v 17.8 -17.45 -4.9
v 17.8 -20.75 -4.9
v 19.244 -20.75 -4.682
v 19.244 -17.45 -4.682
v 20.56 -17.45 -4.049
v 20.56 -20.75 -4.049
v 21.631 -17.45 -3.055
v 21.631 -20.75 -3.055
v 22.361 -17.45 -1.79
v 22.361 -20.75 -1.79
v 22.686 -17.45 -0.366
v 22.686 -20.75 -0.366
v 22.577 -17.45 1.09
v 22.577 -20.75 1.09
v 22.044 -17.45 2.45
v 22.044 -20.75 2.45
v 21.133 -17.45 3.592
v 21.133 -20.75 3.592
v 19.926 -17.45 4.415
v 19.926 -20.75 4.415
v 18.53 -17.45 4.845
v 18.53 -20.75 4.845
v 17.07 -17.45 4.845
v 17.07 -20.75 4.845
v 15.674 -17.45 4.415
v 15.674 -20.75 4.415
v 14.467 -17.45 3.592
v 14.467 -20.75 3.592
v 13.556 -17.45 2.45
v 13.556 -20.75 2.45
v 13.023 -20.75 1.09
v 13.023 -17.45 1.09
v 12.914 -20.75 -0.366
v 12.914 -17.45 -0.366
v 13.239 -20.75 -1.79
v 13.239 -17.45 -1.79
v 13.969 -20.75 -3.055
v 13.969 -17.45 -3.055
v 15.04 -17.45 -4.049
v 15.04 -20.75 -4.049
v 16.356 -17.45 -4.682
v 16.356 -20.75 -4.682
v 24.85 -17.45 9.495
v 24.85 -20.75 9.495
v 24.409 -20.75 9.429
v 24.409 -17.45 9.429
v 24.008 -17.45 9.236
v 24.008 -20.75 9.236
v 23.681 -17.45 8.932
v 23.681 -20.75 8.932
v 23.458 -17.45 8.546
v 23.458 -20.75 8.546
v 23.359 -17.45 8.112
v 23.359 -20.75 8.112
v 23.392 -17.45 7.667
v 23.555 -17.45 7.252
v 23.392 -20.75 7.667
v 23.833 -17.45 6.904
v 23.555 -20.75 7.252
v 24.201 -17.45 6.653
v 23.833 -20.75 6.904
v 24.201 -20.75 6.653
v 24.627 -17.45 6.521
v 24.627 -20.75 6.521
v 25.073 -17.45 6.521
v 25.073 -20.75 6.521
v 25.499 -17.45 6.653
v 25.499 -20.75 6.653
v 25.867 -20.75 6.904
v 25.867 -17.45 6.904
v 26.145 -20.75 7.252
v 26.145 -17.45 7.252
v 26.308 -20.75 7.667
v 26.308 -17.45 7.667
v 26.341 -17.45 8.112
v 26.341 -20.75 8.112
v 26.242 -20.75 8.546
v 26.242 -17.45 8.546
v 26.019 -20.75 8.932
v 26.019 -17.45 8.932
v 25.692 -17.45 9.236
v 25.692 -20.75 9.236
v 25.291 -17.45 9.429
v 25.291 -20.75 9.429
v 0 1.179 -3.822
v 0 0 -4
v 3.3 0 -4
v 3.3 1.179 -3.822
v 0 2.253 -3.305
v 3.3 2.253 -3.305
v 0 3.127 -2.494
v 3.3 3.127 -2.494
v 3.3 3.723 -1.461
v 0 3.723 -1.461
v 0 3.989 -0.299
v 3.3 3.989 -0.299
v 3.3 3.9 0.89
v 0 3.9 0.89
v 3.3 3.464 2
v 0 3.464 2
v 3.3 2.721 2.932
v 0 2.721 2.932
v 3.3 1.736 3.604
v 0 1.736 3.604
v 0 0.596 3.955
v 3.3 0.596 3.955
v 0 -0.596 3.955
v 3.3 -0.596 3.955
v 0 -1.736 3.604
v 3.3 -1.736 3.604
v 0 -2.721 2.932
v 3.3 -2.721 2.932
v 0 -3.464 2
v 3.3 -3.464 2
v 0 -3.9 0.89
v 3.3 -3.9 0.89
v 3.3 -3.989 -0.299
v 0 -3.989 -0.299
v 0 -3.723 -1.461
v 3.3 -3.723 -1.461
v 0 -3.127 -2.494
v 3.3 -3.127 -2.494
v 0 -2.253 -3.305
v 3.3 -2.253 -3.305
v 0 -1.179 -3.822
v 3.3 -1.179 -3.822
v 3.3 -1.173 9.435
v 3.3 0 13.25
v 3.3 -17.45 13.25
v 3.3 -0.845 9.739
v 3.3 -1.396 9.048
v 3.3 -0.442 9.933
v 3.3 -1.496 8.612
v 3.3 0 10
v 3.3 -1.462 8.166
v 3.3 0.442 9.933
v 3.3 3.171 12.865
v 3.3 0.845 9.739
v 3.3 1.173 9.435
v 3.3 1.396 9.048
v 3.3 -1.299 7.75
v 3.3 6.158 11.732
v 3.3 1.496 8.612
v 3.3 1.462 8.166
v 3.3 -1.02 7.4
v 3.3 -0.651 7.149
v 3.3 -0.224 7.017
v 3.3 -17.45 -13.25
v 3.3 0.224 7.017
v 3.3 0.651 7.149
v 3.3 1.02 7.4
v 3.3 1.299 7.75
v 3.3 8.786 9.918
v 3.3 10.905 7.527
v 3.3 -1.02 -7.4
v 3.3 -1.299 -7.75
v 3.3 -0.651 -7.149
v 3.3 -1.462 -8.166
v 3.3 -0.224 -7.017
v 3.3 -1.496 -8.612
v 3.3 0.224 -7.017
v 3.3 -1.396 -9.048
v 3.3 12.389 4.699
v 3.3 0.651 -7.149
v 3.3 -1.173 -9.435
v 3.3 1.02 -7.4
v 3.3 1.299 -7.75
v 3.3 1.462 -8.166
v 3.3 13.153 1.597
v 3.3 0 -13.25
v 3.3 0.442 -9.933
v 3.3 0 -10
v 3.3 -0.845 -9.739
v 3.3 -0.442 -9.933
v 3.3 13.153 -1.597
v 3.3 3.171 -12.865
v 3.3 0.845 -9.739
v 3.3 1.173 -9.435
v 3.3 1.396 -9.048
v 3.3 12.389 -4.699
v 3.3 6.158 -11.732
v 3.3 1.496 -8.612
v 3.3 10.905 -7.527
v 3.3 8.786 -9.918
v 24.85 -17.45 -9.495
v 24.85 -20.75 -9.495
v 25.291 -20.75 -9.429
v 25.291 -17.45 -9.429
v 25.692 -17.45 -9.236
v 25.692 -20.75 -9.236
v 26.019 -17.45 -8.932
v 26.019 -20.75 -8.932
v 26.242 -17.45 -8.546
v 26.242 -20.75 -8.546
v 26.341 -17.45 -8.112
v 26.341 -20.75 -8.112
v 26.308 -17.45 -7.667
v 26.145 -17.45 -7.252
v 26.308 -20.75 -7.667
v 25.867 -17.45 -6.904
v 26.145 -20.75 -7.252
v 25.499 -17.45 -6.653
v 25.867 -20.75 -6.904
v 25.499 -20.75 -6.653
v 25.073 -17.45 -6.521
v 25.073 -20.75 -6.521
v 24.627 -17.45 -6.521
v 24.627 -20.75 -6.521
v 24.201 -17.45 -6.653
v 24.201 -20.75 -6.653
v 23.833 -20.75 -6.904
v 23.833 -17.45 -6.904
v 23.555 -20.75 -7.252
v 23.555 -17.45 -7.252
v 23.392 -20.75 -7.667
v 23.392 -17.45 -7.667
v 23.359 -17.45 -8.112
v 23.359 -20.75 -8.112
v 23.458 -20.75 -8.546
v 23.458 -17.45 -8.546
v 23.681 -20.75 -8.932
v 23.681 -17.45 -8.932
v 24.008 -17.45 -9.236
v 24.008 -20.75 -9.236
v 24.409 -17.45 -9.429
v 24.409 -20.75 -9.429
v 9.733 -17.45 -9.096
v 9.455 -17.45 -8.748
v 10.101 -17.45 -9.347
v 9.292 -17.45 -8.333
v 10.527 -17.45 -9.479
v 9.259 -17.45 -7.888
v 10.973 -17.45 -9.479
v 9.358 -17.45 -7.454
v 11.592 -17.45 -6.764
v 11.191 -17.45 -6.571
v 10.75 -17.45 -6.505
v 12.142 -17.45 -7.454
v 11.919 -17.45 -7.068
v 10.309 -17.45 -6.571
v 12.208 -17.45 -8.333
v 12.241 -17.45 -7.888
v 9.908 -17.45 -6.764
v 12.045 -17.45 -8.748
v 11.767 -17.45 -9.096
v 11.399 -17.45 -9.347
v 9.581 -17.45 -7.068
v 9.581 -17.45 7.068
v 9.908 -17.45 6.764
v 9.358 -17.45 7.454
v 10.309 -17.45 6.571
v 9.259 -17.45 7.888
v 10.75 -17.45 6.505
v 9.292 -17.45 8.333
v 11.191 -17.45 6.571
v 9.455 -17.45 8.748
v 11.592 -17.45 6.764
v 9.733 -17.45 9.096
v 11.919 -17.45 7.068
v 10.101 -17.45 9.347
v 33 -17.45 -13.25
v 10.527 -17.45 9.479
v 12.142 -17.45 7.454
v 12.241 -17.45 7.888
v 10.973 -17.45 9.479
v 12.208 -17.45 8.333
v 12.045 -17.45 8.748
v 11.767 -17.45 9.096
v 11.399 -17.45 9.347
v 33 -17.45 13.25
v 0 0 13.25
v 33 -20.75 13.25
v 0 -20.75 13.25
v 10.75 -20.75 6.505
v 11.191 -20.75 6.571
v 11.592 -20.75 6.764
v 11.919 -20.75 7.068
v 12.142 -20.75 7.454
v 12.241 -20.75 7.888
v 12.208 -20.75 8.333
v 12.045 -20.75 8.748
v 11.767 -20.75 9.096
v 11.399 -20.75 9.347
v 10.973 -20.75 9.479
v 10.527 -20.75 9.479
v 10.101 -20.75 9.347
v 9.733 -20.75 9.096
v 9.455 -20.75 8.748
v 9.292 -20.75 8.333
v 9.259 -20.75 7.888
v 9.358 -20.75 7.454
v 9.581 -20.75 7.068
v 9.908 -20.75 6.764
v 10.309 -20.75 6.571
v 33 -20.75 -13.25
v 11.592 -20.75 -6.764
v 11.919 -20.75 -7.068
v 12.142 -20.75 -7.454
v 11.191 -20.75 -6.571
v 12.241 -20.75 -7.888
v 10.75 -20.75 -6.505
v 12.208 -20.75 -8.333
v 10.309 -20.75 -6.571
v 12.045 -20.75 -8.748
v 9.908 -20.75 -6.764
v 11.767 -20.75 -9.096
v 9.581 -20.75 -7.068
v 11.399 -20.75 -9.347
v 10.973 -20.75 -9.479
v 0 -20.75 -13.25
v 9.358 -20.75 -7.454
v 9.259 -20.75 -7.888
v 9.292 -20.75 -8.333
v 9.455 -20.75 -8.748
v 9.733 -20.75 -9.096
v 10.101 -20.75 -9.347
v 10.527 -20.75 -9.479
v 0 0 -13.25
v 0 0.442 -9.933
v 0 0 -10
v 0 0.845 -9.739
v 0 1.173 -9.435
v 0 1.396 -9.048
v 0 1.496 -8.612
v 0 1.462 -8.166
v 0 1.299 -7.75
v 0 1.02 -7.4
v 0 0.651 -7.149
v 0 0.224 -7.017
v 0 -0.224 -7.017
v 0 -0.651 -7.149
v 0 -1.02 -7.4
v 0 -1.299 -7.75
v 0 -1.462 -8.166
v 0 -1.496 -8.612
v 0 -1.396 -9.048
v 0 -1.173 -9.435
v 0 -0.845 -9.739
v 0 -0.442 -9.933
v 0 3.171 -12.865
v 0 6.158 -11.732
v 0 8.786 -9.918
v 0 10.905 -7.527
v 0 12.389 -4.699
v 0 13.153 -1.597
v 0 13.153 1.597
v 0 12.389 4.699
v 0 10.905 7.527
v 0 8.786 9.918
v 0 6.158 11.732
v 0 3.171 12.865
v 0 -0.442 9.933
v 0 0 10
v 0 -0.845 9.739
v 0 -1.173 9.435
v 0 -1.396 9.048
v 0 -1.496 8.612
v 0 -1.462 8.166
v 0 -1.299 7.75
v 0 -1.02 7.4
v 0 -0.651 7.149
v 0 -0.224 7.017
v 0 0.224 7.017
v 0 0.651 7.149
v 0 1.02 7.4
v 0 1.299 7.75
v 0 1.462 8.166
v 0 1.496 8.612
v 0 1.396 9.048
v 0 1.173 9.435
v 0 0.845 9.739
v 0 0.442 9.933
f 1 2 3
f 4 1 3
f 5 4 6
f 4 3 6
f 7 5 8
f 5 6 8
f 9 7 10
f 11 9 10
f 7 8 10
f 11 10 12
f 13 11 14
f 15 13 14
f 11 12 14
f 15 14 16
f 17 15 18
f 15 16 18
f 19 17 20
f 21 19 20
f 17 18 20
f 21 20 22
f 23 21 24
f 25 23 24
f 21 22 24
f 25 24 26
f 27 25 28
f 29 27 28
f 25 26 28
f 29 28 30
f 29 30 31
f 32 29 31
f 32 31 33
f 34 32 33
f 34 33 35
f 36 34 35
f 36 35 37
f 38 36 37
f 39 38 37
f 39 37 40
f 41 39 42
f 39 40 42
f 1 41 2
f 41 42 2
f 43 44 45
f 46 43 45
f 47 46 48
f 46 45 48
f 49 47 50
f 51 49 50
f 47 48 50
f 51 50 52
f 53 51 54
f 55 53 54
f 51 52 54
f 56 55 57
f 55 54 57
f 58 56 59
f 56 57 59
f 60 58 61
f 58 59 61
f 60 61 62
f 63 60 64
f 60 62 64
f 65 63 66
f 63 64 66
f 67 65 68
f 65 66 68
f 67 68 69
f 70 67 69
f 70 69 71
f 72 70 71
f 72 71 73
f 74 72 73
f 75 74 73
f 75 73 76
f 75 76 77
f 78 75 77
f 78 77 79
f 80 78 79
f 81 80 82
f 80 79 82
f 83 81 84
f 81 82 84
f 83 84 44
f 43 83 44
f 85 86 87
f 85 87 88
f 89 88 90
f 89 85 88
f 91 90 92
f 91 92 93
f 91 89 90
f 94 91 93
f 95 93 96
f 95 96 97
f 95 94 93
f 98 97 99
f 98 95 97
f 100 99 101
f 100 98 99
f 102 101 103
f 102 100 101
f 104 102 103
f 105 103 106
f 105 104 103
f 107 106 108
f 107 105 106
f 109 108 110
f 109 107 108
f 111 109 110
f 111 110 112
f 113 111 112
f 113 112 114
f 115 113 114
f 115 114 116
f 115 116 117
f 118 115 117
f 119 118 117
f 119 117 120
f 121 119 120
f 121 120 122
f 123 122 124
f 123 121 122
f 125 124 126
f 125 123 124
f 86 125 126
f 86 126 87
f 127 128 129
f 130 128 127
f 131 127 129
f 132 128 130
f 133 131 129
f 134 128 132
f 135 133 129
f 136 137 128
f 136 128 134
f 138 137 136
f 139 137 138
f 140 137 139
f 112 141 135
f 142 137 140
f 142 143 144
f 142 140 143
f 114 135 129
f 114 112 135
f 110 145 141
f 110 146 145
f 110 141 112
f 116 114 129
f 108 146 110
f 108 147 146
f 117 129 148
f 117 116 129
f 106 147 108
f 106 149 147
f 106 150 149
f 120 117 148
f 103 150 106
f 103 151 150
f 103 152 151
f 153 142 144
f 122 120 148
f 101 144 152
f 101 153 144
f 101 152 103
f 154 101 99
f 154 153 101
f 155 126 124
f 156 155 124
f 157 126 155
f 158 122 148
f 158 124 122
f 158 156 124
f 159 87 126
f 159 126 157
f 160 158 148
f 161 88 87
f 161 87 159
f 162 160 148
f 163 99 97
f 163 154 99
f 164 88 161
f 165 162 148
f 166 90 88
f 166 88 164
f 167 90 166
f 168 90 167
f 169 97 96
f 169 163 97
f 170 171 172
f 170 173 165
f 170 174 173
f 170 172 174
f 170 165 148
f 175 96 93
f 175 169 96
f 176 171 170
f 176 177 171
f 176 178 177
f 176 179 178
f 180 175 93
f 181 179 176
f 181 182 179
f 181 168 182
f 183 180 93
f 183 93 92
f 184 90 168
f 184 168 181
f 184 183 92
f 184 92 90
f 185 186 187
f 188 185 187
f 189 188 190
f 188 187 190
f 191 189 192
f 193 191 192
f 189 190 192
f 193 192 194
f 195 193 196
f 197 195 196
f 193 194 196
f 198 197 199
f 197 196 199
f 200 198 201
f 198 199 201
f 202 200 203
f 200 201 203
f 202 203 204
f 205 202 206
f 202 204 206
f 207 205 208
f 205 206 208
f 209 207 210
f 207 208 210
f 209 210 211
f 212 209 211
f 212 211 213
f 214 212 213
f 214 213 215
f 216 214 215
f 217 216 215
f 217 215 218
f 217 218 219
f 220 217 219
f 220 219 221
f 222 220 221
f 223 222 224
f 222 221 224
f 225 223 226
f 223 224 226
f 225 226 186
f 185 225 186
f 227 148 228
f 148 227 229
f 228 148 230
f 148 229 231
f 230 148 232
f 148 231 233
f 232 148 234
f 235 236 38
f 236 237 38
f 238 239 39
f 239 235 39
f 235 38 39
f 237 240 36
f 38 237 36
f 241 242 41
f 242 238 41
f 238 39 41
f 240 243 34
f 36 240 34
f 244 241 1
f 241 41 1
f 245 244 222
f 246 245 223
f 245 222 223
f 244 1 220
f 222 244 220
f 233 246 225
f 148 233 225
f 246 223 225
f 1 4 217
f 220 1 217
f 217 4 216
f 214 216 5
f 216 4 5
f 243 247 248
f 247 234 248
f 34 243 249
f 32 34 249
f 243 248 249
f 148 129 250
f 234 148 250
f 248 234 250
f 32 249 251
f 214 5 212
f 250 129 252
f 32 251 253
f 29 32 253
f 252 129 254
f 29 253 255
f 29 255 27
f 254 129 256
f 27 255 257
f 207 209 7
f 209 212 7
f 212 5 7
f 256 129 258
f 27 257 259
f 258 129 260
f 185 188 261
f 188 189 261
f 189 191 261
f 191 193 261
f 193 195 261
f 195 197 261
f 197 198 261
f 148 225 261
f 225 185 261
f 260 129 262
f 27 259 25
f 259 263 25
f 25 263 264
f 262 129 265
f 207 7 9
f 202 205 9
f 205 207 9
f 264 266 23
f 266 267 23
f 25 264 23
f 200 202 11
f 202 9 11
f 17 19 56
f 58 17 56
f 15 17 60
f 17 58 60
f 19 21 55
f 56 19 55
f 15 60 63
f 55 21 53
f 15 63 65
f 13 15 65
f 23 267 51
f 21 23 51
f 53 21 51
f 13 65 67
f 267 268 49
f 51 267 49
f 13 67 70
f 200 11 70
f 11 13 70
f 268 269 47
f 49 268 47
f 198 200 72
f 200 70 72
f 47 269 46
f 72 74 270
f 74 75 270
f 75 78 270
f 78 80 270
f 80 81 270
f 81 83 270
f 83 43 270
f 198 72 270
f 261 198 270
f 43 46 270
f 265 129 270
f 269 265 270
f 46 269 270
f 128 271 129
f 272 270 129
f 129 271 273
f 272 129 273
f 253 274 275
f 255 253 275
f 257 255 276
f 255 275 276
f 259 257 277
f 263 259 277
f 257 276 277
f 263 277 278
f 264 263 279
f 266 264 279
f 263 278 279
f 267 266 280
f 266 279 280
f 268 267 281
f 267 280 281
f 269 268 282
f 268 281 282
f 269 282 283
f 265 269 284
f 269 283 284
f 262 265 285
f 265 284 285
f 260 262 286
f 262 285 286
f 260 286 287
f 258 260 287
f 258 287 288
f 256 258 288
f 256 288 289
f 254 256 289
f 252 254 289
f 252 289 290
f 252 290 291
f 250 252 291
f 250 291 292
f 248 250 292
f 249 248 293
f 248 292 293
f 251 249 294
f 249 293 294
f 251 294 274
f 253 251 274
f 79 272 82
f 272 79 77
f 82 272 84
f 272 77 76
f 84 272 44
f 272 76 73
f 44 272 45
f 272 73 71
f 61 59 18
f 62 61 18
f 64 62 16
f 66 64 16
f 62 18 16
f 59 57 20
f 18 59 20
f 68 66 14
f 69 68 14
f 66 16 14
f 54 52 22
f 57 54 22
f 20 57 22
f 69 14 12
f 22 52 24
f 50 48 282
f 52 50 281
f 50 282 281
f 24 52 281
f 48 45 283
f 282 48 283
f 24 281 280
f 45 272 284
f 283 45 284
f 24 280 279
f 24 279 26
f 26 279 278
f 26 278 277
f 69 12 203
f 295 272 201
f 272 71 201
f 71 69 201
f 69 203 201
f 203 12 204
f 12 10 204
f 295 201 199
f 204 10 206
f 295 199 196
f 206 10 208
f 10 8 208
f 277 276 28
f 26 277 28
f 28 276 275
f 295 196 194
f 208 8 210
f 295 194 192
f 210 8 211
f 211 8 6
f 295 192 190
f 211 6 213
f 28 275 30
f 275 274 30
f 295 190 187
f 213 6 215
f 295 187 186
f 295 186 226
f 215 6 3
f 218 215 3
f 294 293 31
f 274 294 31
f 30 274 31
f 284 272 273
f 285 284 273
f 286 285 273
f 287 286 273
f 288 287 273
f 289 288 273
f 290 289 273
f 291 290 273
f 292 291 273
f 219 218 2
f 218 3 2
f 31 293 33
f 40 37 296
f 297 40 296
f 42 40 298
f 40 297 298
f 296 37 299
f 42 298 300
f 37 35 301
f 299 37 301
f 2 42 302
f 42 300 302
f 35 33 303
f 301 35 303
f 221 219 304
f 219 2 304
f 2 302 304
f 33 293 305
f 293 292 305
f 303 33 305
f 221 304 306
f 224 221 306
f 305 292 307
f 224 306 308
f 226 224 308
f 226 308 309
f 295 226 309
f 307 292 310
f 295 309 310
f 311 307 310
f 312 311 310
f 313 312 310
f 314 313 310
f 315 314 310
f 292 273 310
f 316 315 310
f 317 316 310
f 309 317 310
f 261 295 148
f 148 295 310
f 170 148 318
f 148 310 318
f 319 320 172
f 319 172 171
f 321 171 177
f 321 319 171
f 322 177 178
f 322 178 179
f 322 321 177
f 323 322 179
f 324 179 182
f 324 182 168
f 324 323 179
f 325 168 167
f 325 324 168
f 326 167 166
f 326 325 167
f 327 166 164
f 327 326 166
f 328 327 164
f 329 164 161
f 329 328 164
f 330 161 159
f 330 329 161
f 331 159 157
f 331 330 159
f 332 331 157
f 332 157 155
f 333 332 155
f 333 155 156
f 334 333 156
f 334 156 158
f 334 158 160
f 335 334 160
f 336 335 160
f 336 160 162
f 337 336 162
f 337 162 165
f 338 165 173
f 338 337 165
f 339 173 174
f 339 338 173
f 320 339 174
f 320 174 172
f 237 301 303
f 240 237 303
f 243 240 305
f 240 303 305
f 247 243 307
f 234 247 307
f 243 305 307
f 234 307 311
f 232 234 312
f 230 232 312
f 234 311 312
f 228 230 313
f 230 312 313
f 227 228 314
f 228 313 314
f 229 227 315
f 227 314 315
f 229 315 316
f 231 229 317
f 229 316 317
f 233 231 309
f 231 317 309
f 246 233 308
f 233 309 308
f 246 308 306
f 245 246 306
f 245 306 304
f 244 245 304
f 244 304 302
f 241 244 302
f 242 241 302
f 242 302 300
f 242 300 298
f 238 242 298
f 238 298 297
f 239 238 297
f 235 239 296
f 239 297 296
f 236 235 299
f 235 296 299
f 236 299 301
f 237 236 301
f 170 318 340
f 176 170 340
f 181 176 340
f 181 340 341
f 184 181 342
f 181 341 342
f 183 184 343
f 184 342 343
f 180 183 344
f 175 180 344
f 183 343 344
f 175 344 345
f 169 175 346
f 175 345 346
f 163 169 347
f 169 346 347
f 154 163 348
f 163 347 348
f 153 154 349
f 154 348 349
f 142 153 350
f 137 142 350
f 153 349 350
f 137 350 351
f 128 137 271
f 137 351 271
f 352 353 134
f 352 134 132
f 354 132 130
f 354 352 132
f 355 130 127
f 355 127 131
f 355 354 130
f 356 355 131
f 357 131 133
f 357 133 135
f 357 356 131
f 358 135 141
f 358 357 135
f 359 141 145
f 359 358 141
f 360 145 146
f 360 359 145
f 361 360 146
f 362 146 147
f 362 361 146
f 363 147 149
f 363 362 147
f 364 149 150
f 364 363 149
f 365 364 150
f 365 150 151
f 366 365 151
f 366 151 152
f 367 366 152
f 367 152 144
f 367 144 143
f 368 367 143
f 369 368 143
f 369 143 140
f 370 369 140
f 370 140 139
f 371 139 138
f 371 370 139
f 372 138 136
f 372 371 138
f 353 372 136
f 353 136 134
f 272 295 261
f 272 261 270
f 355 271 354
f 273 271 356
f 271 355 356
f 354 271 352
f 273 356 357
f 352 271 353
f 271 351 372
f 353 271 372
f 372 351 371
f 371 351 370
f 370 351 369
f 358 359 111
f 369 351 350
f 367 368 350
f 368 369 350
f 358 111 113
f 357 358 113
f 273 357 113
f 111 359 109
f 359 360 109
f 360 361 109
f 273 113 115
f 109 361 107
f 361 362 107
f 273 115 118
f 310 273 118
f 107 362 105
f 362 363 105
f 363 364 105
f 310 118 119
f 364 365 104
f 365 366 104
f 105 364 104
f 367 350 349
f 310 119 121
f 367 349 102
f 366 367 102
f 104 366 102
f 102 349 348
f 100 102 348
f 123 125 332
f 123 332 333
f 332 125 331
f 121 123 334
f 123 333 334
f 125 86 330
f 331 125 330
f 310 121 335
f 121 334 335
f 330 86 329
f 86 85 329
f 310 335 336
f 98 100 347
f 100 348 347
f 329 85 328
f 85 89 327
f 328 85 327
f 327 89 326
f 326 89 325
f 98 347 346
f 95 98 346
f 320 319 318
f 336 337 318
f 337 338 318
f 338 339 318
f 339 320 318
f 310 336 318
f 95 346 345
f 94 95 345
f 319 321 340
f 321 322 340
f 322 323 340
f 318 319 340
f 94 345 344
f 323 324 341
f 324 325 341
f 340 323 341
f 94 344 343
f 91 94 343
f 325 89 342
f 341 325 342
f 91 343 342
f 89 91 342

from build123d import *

# Parameters (mm, degrees)
SKETCH_1_R      = 4
SKETCH_1_R_2    = 1.5
EXTRUDE_1_DEPTH = 3.3
SKETCH_2_W      = 33
SKETCH_2_H      = 26.5
SKETCH_2_R      = 4.9
SKETCH_2_R_2    = 1.495427909
EXTRUDE_2_DEPTH = 3.3


with BuildPart() as part:
    # 草图1 → 凸台-拉伸1 (new body)
    with BuildSketch(Plane(origin=(0, 0, 0), x_dir=(0, 0, -1), z_dir=(1, 0, 0))):
        with BuildLine():
            Line((-13.25, 0), (-13.25, -20.75))
            Line((-13.25, -20.75), (13.25, -20.75))
            Line((13.25, -20.75), (13.25, 0))
            ThreePointArc((13.25, 0), (0, 13.25), (-13.25, 0))
        make_face()
        Circle(SKETCH_1_R, mode=Mode.SUBTRACT)
        with Locations((8.5, 0)):
            Circle(SKETCH_1_R_2, mode=Mode.SUBTRACT)
        with Locations(Location((-8.5, 0, 0), (0, 0, 180))):
            Circle(SKETCH_1_R_2, mode=Mode.SUBTRACT)
    extrude(amount=EXTRUDE_1_DEPTH)

    # 草图2 → 凸台-拉伸2 (add)
    with BuildSketch(Plane.XZ.offset(20.75)):
        with Locations((16.5, 0)):
            Rectangle(SKETCH_2_W, SKETCH_2_H)
        with Locations(Location((17.8, 0, 0), (0, 0, 270))):
            Circle(SKETCH_2_R, mode=Mode.SUBTRACT)
        with Locations(Location((24.85, -8, 0), (0, 0, 270))):
            Circle(SKETCH_2_R_2, mode=Mode.SUBTRACT)
        with Locations(Location((24.85, 8, 0), (0, 0, 90))):
            Circle(SKETCH_2_R_2, mode=Mode.SUBTRACT)
        with Locations(Location((10.75, 8, 0), (0, 0, 270))):
            Circle(SKETCH_2_R_2, mode=Mode.SUBTRACT)
        with Locations(Location((10.75, -8, 0), (0, 0, 90))):
            Circle(SKETCH_2_R_2, mode=Mode.SUBTRACT)
    extrude(amount=-EXTRUDE_2_DEPTH)


solid = part.part
